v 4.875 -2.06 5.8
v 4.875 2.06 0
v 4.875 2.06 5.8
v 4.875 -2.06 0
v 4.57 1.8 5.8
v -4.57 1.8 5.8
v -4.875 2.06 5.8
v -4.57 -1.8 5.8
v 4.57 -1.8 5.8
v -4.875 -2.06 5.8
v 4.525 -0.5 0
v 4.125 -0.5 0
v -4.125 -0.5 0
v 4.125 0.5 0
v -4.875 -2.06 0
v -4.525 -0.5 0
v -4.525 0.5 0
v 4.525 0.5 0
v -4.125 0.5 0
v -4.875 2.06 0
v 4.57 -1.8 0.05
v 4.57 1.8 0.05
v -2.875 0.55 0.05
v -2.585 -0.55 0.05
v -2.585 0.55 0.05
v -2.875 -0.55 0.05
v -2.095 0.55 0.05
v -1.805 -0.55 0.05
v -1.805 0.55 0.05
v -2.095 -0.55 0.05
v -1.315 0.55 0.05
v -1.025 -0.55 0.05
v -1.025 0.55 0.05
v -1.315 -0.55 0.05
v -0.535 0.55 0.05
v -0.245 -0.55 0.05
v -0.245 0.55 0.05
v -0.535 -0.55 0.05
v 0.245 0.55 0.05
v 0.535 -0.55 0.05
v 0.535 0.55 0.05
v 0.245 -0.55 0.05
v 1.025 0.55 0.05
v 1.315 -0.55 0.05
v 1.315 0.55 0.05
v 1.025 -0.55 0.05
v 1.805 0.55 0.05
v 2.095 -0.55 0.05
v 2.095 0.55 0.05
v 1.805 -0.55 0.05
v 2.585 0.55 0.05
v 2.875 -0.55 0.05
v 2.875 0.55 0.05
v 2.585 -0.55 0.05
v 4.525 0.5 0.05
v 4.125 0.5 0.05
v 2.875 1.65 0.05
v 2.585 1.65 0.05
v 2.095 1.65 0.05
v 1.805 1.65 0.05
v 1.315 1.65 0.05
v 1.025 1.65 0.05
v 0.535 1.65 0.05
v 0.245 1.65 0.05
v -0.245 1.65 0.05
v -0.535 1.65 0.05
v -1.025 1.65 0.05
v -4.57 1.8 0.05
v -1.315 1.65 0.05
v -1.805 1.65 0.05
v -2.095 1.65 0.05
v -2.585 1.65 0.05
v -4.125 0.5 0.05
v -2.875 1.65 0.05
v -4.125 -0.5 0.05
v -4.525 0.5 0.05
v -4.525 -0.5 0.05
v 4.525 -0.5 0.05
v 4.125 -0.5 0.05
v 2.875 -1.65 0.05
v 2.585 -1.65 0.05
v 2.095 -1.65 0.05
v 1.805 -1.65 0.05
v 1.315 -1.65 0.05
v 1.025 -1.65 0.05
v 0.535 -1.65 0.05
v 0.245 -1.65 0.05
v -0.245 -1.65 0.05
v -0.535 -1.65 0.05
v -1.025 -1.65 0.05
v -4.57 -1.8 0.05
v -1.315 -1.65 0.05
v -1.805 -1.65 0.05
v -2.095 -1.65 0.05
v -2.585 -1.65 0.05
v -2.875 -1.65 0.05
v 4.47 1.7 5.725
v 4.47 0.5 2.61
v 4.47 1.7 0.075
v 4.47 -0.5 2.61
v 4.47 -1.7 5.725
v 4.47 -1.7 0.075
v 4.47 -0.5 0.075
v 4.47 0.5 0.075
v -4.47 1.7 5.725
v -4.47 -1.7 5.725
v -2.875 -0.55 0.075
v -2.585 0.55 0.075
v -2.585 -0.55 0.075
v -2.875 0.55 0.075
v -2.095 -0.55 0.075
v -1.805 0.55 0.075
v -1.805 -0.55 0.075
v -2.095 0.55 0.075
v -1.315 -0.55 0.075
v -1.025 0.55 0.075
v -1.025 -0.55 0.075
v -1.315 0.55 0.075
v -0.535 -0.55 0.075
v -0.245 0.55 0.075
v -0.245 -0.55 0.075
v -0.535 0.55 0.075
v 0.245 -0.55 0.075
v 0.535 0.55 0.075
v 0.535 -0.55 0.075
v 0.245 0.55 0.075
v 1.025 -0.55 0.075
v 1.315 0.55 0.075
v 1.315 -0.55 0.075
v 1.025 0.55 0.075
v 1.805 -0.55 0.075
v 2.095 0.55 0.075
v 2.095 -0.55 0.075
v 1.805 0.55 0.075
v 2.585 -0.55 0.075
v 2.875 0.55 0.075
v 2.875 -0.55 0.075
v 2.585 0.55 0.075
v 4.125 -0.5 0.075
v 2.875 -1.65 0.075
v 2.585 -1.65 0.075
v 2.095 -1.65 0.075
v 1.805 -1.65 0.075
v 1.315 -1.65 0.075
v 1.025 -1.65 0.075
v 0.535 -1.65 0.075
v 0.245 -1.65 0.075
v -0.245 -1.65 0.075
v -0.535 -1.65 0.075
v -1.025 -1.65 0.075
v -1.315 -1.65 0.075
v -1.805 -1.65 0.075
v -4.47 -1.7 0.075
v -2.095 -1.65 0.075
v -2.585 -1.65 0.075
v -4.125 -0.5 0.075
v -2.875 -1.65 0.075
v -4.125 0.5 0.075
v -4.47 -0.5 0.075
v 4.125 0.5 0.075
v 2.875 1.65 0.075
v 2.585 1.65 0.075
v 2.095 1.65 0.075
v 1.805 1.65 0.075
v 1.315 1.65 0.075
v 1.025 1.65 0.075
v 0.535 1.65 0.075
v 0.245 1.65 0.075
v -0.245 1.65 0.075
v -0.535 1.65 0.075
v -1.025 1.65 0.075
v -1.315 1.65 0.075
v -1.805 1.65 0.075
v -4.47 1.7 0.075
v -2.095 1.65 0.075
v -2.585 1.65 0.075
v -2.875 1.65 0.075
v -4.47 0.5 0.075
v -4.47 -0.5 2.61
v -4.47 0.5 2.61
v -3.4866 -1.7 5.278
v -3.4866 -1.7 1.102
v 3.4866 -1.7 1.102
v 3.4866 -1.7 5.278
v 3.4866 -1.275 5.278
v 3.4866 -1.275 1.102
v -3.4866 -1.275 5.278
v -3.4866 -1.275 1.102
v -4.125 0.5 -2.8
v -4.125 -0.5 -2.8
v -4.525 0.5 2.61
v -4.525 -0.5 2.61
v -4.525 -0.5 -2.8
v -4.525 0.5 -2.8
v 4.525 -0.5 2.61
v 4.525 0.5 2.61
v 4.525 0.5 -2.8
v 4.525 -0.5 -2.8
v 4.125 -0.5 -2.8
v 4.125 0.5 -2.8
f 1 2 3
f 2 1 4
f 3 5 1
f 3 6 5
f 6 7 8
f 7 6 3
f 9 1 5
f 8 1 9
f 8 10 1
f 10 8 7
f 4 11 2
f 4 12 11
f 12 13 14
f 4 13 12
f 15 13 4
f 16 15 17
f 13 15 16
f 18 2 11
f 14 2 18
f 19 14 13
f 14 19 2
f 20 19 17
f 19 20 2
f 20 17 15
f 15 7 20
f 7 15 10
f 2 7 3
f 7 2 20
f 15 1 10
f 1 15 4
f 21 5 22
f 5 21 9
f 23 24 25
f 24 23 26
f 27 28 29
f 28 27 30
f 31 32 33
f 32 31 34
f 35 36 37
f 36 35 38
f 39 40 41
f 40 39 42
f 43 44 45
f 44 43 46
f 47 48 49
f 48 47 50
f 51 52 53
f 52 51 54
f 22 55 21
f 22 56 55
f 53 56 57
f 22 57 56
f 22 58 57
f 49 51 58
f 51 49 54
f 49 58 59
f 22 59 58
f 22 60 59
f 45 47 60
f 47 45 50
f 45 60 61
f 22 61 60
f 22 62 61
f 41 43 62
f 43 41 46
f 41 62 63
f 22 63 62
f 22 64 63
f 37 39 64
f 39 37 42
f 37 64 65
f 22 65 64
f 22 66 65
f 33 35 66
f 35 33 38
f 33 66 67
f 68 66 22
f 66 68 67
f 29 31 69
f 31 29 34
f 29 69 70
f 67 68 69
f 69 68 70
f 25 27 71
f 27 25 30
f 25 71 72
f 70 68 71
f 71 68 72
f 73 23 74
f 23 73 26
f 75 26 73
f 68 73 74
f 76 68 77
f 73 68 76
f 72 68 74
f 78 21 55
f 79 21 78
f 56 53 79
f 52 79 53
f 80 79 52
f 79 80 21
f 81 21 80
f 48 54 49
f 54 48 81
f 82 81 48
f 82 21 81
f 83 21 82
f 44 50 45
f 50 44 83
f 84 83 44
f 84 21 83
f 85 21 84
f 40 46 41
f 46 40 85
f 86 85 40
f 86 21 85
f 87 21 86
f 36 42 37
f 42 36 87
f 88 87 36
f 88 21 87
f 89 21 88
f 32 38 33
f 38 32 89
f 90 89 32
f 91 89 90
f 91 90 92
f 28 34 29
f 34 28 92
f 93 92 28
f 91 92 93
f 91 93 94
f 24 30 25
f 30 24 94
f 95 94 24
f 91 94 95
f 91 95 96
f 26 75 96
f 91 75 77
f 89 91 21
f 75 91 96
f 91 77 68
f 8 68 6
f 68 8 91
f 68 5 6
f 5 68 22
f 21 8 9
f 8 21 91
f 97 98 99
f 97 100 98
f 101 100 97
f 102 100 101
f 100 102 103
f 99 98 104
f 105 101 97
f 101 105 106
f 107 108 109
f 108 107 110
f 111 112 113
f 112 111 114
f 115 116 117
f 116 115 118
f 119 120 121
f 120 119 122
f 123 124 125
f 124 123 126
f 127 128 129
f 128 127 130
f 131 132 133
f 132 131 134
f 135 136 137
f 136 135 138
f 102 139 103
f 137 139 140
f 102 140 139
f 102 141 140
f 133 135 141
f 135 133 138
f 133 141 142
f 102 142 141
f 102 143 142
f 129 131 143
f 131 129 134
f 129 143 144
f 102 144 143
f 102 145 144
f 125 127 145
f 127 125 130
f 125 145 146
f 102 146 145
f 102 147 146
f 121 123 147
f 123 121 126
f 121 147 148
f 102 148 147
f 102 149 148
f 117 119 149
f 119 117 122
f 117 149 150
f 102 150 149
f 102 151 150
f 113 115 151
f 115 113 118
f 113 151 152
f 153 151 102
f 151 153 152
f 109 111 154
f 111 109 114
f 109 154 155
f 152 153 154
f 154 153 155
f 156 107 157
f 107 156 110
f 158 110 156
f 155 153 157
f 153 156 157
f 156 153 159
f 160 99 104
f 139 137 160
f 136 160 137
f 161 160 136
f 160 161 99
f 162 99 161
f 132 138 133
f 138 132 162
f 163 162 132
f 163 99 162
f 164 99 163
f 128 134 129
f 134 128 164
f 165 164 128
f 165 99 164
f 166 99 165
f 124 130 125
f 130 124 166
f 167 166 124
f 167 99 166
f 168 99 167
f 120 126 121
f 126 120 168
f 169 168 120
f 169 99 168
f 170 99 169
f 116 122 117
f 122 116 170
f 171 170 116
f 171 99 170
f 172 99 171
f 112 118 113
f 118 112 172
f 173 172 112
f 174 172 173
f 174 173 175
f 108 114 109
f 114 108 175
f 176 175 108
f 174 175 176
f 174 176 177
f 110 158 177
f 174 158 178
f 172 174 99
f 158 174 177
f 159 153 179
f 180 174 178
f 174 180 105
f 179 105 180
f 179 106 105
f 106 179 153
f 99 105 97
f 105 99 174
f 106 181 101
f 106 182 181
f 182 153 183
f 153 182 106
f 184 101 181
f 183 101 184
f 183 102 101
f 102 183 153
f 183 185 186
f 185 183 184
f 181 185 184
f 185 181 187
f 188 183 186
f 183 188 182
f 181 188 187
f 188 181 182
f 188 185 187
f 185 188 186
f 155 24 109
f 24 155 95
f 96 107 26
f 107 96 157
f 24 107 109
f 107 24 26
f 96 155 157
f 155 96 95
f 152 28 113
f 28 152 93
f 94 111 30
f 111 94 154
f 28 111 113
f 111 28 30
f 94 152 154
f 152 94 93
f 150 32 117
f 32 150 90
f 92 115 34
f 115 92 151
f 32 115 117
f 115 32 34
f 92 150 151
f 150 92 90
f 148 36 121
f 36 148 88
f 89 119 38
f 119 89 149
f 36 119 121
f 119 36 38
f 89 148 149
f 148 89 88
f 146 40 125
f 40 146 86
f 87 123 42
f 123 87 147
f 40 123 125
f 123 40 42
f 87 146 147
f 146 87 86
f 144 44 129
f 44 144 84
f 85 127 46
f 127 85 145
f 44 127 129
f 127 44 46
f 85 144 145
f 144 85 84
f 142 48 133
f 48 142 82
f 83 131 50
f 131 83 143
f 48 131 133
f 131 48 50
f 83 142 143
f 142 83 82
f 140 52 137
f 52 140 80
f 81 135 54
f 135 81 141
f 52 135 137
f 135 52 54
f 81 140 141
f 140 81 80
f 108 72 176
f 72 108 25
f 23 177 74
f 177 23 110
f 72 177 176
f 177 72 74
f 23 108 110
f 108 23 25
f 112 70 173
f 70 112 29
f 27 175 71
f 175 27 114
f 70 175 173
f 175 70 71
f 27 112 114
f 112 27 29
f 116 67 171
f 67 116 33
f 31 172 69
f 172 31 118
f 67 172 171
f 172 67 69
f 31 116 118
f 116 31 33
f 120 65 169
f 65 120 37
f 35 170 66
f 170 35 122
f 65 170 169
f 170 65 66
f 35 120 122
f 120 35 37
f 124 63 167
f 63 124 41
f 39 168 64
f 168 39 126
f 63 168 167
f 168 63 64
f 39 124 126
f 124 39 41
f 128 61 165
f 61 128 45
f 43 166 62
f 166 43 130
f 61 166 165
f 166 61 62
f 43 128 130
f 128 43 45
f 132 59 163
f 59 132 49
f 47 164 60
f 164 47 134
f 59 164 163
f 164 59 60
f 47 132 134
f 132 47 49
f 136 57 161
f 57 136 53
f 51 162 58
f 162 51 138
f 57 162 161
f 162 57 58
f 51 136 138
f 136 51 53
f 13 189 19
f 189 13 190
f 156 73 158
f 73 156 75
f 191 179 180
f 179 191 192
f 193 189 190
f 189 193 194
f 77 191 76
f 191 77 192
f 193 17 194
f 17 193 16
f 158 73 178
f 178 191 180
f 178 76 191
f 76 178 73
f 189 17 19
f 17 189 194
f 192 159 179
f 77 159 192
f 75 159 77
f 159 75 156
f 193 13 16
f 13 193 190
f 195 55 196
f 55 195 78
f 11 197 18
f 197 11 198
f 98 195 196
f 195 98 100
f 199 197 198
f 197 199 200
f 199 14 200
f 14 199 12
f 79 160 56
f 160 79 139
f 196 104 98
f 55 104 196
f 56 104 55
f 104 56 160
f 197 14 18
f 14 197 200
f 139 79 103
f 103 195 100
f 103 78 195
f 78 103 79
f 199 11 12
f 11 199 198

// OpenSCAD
// USB-C 16P vertical short H=5.8 — pads match USB_C_Receptacle_16P_Vertical_SMT_Short
// Fab 9.75×4.12; shell ~8.94×3.40; SMT y=±1.10; shield x=±4.325
$fn = 24;

fab_w = 9.75;
fab_d = 4.12;
shell_w = 8.94;
shell_d = 3.40;
h = 5.80;
pad_w = 0.29;
pad_h = 1.10;
pad_t = 0.15;
row_y = 1.10;
pad_xs = [-2.73, -1.95, -1.17, -0.39, 0.39, 1.17, 1.95, 2.73];
slot_x = 4.325;
slot_w = 0.40;
slot_d = 1.00;
slot_below = 2.80;

module smt_stub(x, y) {
  translate([x, y, pad_t / 2]) cube([pad_w, pad_h, pad_t], center = true);
}

module shield(x) {
  z0 = -slot_below;
  z1 = h * 0.45;
  translate([x, 0, (z0 + z1) / 2])
    cube([slot_w, slot_d, z1 - z0], center = true);
}

// Plastic frame to fab envelope
color("ivory")
  difference() {
    translate([0, 0, h / 2]) cube([fab_w, fab_d, h], center = true);
    translate([0, 0, h / 2 + 0.05])
      cube([shell_w + 0.2, shell_d + 0.2, h], center = true);
  }

// Metal shell + mouth on -Y (plug toward board butt)
color("silver")
  difference() {
    translate([0, 0, h / 2]) cube([shell_w, shell_d, h - 0.15], center = true);
    translate([0, -shell_d / 2 + 0.15, h * 0.55])
      cube([shell_w * 0.78, 0.55, h * 0.72], center = true);
  }

color("black")
  translate([0, -0.15, h * 0.52])
    cube([shell_w * 0.42, shell_d * 0.35, h * 0.55], center = true);

color("gold") {
  for (y = [-row_y, row_y])
    for (x = pad_xs)
      smt_stub(x, y);
}

color("silver") {
  shield(-slot_x);
  shield( slot_x);
}
